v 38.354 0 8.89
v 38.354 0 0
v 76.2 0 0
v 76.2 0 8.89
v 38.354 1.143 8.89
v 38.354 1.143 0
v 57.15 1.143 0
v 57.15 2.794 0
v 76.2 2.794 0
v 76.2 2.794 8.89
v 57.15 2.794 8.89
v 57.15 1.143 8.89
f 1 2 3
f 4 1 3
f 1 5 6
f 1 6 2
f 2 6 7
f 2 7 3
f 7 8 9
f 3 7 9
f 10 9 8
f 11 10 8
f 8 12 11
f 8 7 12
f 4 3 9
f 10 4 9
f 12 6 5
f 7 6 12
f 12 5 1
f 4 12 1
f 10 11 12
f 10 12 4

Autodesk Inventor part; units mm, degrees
ref_plane "YZ Plane" through (0, 0, 0) normal (1, 0, 0) x (0, 1, 0)
ref_plane "XZ Plane" through (0, 0, 0) normal (0, 1, 0) x (-1, 0, 0)
ref_plane "XY Plane" through (0, 0, 0) normal (0, 0, 1) x (1, 0, 0)
sketch "Sketch1" plane through (0, 0, 0) normal (0, 0, 1) x (1, 0, 0)
  line L0 (38.354, 0) -> (76.2, 0)
  line L1 (76.2, 0) -> (76.2, 2.794)
  line L2 (76.2, 2.794) -> (57.15, 2.794)
  line L3 (57.15, 1.143) -> (57.15, 2.794)
  line L4 (38.354, 1.143) -> (57.15, 1.143)
  line L5 (38.354, 1.143) -> (38.354, 0)
  point P0 (0, 0)
extrude "Extrusion1" add sketch "Sketch1" along normal blind 8.89
properties part number "Mesh Test"
